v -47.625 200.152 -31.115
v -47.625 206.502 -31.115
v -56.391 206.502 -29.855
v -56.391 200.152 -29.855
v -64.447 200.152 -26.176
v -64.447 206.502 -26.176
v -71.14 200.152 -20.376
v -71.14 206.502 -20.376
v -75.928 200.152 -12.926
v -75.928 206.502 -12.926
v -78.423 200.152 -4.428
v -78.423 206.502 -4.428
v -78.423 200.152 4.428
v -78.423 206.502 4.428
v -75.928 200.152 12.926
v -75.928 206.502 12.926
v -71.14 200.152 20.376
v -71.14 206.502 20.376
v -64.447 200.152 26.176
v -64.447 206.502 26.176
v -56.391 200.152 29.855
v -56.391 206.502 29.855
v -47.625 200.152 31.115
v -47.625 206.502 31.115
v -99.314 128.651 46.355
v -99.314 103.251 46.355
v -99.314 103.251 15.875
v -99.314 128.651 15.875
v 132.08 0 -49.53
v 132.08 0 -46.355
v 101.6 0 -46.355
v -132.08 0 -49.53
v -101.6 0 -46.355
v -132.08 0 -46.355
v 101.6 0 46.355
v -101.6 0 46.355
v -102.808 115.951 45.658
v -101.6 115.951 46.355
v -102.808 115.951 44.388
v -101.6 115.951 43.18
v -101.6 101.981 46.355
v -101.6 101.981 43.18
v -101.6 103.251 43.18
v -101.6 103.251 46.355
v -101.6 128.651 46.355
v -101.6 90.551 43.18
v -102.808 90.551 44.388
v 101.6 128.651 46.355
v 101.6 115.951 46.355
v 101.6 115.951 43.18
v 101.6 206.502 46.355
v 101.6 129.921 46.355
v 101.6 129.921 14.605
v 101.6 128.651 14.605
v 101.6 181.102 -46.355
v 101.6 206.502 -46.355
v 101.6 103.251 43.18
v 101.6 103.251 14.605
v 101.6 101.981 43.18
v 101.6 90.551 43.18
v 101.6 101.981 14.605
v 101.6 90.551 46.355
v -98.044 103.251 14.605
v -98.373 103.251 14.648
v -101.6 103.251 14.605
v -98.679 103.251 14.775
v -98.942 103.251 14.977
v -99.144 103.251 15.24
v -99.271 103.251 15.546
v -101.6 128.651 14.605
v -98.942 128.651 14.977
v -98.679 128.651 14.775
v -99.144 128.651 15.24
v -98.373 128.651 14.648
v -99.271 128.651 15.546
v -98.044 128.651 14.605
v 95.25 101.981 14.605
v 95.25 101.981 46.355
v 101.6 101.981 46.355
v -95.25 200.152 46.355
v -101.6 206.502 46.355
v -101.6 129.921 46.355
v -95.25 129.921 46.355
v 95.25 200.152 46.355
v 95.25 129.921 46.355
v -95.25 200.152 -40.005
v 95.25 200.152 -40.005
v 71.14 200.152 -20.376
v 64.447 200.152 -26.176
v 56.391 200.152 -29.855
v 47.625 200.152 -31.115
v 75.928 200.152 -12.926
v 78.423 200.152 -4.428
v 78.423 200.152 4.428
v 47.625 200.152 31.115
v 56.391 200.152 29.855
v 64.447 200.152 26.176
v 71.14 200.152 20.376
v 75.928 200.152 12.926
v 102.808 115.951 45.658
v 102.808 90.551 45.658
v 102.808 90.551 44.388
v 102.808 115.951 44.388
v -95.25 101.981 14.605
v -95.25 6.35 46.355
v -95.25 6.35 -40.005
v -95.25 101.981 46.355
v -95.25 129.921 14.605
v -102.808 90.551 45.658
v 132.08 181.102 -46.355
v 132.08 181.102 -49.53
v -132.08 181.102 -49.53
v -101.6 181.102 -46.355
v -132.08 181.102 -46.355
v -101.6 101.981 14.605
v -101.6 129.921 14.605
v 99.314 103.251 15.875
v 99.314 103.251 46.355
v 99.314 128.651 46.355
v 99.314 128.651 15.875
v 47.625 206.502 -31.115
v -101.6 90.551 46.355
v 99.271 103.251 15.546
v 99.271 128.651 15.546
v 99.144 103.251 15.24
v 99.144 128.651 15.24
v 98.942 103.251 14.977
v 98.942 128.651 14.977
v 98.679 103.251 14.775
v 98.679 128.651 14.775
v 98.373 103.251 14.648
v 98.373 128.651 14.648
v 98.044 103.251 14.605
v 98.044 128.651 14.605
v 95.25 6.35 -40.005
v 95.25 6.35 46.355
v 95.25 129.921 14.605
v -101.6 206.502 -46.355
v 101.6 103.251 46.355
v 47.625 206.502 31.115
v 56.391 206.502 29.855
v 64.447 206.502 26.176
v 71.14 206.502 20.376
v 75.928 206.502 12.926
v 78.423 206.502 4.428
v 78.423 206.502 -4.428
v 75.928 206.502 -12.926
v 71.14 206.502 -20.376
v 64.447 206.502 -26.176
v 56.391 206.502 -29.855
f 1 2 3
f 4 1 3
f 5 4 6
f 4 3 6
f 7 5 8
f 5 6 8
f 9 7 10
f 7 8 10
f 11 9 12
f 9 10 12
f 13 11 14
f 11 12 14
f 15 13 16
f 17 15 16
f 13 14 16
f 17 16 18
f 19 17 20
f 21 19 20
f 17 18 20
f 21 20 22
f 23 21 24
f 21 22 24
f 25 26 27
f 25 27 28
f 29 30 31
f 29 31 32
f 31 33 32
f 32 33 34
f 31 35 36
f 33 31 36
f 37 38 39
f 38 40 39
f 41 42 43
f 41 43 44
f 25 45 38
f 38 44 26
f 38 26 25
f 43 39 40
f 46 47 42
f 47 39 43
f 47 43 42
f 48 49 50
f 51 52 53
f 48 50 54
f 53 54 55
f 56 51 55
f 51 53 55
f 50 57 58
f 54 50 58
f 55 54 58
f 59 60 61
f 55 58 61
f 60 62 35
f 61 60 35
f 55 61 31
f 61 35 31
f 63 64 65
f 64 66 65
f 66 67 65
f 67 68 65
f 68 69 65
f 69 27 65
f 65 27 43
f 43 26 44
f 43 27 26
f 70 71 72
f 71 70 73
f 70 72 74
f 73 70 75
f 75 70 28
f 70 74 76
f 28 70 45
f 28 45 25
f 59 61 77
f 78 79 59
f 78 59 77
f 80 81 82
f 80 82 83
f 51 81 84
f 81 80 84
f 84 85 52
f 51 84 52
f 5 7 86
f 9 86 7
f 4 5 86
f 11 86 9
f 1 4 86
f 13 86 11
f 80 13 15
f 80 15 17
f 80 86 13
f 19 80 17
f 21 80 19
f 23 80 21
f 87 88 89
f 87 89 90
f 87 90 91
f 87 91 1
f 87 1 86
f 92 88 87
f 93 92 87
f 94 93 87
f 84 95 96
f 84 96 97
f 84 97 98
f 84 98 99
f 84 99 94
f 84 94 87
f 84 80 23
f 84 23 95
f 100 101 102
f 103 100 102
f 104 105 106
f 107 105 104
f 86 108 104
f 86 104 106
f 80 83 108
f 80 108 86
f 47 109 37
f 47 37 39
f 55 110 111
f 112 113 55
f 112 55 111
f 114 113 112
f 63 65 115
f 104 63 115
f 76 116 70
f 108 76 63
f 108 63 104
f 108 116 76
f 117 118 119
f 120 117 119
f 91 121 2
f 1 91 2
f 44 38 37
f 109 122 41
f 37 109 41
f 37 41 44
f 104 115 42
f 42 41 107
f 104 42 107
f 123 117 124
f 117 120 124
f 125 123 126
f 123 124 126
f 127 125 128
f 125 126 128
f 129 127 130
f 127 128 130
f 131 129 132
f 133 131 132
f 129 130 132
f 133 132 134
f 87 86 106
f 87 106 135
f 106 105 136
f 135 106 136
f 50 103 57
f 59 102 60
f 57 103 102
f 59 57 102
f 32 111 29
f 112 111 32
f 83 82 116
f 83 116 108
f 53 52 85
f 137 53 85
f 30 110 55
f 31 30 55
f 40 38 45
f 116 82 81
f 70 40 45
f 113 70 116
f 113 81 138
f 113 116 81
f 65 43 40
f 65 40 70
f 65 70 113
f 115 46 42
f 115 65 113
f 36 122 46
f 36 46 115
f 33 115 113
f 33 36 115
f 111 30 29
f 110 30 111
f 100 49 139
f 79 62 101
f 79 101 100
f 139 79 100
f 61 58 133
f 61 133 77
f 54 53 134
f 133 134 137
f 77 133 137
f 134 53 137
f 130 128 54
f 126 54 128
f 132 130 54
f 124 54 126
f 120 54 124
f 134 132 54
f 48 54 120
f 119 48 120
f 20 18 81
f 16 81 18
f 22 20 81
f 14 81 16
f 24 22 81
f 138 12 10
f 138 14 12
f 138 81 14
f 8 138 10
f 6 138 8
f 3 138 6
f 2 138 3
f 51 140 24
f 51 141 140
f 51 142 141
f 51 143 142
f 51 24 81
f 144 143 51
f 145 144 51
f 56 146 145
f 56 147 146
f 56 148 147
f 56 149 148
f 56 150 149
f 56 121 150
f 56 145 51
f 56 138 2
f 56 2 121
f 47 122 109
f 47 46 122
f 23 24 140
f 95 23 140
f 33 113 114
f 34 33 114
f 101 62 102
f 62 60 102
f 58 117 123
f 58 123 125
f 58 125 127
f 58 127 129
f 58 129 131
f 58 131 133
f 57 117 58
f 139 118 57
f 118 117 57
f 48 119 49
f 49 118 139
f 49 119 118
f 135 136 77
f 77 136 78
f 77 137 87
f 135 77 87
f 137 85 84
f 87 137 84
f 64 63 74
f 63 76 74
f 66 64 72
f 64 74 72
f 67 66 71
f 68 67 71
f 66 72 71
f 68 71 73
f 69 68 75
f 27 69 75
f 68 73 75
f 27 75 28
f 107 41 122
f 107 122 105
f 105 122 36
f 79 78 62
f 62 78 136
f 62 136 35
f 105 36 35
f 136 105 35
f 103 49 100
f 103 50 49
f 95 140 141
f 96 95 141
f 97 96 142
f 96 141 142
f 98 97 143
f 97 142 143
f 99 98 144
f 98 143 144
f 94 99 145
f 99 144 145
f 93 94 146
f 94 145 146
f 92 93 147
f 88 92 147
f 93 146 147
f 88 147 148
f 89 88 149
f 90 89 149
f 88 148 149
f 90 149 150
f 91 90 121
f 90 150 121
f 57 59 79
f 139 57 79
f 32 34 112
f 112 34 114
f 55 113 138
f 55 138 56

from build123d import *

# Parameters (mm, degrees)
SKETCH2_W            = 203.2
SKETCH2_H            = 92.71
BOSS_EXTRUDE1_DEPTH  = 206.502
SKETCH3_W            = 190.5
SKETCH3_H            = 193.802
CUT_EXTRUDE1_DEPTH   = 86.36
CUT_EXTRUDE2_REACH   = 236.765
SKETCH6_W            = 264.16
SKETCH6_H            = 181.102
BOSS_EXTRUDE2_DEPTH  = 3.175
SKETCH8_W            = 4.064
SKETCH8_H            = 25.4
SKETCH8_W_2          = 6.35
SKETCH8_H_2          = 1.27
CUT_EXTRUDE3_DEPTH   = 31.75
FILLET1_R            = 1.27
BOSS_EXTRUDE3_DEPTH  = 12.7
FILLET1_OF_MIRROR1_R = 1.27


with BuildPart() as part:
    # Sketch2 → Boss-Extrude1 (new body)
    with BuildSketch(Plane(origin=(0, 0, 0), x_dir=(1, 0, 0), z_dir=(0, 1, 0))):
        Rectangle(SKETCH2_W, SKETCH2_H)
    extrude(amount=BOSS_EXTRUDE1_DEPTH)

    # Sketch3 → Cut-Extrude1 (cut)
    with BuildSketch(Plane.XY.offset(46.355)):
        with Locations((0, 103.251)):
            Rectangle(SKETCH3_W, SKETCH3_H)
    extrude(amount=-CUT_EXTRUDE1_DEPTH, mode=Mode.SUBTRACT)

    # Sketch5 → Cut-Extrude2 (cut, up to next)
    with BuildSketch(Plane.XZ.offset(-206.502), mode=Mode.PRIVATE) as cut_extrude2_sk1:
        with BuildLine():
            Line((-47.625, 31.115), (47.625, 31.115))
            ThreePointArc((47.625, 31.115), (78.74, 0), (47.625, -31.115))
            Line((47.625, -31.115), (-47.625, -31.115))
            ThreePointArc((-47.625, -31.115), (-78.74, 0), (-47.625, 31.115))
        make_face()
    cut_extrude2_tool1 = extrude(cut_extrude2_sk1.sketch, amount=CUT_EXTRUDE2_REACH, mode=Mode.PRIVATE) & part.part
    add(cut_extrude2_tool1.solids().sort_by_distance((0, 206.502, 0))[0], mode=Mode.SUBTRACT)

    # Sketch6 → Boss-Extrude2 (add)
    with BuildSketch(Plane(origin=(0, 0, -46.355), x_dir=(-1, 0, 0), z_dir=(0, 0, -1))):
        with Locations((0, 90.551)):
            Rectangle(SKETCH6_W, SKETCH6_H)
    extrude(amount=BOSS_EXTRUDE2_DEPTH)

    # Sketch8 → Cut-Extrude3 (cut)
    with BuildSketch(Plane.XY.offset(46.355)):
        with Locations((-97.282, 115.951)):
            Rectangle(SKETCH8_W, SKETCH8_H)
        Polygon((-95.25, 103.251), (-99.314, 103.251), (-101.6, 103.251), (-101.6, 101.981), (-95.25, 101.981), align=None)
        with Locations((-98.425, 129.286)):
            Rectangle(SKETCH8_W_2, SKETCH8_H_2)
    cut_extrude3 = extrude(amount=-CUT_EXTRUDE3_DEPTH, mode=Mode.SUBTRACT)

    # Fillet1
    fillet1_edges = [part.edges().sort_by_distance(p)[0] for p in [
        (-99.314, 115.951, 14.605),
    ]]
    fillet(fillet1_edges, radius=FILLET1_R)

    # Sketch10 → Boss-Extrude3 (add, symmetric)
    with BuildSketch(Plane(origin=(0, 103.251, 0), x_dir=(-1, 0, 0), z_dir=(0, -1, 0))):
        Polygon((101.6, -46.355), (102.807721606, -45.657721606), (102.807721606, -44.387721606), (101.6, -43.18), align=None)
    boss_extrude3 = extrude(amount=BOSS_EXTRUDE3_DEPTH, both=True)

    # Mirror1: Cut-Extrude3, Boss-Extrude3 across plane
    add(cut_extrude3.mirror(Plane(origin=(0, 0, 0), x_dir=(0, 0, 1), z_dir=(1, 0, 0))), mode=Mode.SUBTRACT)
    add(boss_extrude3.mirror(Plane(origin=(0, 0, 0), x_dir=(0, 0, 1), z_dir=(1, 0, 0))))

    # Fillet1 of Mirror1
    fillet1_of_mirror1_edges = [part.edges().sort_by_distance(p)[0] for p in [
        (99.314, 115.951, 14.605),
    ]]
    fillet(fillet1_of_mirror1_edges, radius=FILLET1_OF_MIRROR1_R)


solid = part.part
